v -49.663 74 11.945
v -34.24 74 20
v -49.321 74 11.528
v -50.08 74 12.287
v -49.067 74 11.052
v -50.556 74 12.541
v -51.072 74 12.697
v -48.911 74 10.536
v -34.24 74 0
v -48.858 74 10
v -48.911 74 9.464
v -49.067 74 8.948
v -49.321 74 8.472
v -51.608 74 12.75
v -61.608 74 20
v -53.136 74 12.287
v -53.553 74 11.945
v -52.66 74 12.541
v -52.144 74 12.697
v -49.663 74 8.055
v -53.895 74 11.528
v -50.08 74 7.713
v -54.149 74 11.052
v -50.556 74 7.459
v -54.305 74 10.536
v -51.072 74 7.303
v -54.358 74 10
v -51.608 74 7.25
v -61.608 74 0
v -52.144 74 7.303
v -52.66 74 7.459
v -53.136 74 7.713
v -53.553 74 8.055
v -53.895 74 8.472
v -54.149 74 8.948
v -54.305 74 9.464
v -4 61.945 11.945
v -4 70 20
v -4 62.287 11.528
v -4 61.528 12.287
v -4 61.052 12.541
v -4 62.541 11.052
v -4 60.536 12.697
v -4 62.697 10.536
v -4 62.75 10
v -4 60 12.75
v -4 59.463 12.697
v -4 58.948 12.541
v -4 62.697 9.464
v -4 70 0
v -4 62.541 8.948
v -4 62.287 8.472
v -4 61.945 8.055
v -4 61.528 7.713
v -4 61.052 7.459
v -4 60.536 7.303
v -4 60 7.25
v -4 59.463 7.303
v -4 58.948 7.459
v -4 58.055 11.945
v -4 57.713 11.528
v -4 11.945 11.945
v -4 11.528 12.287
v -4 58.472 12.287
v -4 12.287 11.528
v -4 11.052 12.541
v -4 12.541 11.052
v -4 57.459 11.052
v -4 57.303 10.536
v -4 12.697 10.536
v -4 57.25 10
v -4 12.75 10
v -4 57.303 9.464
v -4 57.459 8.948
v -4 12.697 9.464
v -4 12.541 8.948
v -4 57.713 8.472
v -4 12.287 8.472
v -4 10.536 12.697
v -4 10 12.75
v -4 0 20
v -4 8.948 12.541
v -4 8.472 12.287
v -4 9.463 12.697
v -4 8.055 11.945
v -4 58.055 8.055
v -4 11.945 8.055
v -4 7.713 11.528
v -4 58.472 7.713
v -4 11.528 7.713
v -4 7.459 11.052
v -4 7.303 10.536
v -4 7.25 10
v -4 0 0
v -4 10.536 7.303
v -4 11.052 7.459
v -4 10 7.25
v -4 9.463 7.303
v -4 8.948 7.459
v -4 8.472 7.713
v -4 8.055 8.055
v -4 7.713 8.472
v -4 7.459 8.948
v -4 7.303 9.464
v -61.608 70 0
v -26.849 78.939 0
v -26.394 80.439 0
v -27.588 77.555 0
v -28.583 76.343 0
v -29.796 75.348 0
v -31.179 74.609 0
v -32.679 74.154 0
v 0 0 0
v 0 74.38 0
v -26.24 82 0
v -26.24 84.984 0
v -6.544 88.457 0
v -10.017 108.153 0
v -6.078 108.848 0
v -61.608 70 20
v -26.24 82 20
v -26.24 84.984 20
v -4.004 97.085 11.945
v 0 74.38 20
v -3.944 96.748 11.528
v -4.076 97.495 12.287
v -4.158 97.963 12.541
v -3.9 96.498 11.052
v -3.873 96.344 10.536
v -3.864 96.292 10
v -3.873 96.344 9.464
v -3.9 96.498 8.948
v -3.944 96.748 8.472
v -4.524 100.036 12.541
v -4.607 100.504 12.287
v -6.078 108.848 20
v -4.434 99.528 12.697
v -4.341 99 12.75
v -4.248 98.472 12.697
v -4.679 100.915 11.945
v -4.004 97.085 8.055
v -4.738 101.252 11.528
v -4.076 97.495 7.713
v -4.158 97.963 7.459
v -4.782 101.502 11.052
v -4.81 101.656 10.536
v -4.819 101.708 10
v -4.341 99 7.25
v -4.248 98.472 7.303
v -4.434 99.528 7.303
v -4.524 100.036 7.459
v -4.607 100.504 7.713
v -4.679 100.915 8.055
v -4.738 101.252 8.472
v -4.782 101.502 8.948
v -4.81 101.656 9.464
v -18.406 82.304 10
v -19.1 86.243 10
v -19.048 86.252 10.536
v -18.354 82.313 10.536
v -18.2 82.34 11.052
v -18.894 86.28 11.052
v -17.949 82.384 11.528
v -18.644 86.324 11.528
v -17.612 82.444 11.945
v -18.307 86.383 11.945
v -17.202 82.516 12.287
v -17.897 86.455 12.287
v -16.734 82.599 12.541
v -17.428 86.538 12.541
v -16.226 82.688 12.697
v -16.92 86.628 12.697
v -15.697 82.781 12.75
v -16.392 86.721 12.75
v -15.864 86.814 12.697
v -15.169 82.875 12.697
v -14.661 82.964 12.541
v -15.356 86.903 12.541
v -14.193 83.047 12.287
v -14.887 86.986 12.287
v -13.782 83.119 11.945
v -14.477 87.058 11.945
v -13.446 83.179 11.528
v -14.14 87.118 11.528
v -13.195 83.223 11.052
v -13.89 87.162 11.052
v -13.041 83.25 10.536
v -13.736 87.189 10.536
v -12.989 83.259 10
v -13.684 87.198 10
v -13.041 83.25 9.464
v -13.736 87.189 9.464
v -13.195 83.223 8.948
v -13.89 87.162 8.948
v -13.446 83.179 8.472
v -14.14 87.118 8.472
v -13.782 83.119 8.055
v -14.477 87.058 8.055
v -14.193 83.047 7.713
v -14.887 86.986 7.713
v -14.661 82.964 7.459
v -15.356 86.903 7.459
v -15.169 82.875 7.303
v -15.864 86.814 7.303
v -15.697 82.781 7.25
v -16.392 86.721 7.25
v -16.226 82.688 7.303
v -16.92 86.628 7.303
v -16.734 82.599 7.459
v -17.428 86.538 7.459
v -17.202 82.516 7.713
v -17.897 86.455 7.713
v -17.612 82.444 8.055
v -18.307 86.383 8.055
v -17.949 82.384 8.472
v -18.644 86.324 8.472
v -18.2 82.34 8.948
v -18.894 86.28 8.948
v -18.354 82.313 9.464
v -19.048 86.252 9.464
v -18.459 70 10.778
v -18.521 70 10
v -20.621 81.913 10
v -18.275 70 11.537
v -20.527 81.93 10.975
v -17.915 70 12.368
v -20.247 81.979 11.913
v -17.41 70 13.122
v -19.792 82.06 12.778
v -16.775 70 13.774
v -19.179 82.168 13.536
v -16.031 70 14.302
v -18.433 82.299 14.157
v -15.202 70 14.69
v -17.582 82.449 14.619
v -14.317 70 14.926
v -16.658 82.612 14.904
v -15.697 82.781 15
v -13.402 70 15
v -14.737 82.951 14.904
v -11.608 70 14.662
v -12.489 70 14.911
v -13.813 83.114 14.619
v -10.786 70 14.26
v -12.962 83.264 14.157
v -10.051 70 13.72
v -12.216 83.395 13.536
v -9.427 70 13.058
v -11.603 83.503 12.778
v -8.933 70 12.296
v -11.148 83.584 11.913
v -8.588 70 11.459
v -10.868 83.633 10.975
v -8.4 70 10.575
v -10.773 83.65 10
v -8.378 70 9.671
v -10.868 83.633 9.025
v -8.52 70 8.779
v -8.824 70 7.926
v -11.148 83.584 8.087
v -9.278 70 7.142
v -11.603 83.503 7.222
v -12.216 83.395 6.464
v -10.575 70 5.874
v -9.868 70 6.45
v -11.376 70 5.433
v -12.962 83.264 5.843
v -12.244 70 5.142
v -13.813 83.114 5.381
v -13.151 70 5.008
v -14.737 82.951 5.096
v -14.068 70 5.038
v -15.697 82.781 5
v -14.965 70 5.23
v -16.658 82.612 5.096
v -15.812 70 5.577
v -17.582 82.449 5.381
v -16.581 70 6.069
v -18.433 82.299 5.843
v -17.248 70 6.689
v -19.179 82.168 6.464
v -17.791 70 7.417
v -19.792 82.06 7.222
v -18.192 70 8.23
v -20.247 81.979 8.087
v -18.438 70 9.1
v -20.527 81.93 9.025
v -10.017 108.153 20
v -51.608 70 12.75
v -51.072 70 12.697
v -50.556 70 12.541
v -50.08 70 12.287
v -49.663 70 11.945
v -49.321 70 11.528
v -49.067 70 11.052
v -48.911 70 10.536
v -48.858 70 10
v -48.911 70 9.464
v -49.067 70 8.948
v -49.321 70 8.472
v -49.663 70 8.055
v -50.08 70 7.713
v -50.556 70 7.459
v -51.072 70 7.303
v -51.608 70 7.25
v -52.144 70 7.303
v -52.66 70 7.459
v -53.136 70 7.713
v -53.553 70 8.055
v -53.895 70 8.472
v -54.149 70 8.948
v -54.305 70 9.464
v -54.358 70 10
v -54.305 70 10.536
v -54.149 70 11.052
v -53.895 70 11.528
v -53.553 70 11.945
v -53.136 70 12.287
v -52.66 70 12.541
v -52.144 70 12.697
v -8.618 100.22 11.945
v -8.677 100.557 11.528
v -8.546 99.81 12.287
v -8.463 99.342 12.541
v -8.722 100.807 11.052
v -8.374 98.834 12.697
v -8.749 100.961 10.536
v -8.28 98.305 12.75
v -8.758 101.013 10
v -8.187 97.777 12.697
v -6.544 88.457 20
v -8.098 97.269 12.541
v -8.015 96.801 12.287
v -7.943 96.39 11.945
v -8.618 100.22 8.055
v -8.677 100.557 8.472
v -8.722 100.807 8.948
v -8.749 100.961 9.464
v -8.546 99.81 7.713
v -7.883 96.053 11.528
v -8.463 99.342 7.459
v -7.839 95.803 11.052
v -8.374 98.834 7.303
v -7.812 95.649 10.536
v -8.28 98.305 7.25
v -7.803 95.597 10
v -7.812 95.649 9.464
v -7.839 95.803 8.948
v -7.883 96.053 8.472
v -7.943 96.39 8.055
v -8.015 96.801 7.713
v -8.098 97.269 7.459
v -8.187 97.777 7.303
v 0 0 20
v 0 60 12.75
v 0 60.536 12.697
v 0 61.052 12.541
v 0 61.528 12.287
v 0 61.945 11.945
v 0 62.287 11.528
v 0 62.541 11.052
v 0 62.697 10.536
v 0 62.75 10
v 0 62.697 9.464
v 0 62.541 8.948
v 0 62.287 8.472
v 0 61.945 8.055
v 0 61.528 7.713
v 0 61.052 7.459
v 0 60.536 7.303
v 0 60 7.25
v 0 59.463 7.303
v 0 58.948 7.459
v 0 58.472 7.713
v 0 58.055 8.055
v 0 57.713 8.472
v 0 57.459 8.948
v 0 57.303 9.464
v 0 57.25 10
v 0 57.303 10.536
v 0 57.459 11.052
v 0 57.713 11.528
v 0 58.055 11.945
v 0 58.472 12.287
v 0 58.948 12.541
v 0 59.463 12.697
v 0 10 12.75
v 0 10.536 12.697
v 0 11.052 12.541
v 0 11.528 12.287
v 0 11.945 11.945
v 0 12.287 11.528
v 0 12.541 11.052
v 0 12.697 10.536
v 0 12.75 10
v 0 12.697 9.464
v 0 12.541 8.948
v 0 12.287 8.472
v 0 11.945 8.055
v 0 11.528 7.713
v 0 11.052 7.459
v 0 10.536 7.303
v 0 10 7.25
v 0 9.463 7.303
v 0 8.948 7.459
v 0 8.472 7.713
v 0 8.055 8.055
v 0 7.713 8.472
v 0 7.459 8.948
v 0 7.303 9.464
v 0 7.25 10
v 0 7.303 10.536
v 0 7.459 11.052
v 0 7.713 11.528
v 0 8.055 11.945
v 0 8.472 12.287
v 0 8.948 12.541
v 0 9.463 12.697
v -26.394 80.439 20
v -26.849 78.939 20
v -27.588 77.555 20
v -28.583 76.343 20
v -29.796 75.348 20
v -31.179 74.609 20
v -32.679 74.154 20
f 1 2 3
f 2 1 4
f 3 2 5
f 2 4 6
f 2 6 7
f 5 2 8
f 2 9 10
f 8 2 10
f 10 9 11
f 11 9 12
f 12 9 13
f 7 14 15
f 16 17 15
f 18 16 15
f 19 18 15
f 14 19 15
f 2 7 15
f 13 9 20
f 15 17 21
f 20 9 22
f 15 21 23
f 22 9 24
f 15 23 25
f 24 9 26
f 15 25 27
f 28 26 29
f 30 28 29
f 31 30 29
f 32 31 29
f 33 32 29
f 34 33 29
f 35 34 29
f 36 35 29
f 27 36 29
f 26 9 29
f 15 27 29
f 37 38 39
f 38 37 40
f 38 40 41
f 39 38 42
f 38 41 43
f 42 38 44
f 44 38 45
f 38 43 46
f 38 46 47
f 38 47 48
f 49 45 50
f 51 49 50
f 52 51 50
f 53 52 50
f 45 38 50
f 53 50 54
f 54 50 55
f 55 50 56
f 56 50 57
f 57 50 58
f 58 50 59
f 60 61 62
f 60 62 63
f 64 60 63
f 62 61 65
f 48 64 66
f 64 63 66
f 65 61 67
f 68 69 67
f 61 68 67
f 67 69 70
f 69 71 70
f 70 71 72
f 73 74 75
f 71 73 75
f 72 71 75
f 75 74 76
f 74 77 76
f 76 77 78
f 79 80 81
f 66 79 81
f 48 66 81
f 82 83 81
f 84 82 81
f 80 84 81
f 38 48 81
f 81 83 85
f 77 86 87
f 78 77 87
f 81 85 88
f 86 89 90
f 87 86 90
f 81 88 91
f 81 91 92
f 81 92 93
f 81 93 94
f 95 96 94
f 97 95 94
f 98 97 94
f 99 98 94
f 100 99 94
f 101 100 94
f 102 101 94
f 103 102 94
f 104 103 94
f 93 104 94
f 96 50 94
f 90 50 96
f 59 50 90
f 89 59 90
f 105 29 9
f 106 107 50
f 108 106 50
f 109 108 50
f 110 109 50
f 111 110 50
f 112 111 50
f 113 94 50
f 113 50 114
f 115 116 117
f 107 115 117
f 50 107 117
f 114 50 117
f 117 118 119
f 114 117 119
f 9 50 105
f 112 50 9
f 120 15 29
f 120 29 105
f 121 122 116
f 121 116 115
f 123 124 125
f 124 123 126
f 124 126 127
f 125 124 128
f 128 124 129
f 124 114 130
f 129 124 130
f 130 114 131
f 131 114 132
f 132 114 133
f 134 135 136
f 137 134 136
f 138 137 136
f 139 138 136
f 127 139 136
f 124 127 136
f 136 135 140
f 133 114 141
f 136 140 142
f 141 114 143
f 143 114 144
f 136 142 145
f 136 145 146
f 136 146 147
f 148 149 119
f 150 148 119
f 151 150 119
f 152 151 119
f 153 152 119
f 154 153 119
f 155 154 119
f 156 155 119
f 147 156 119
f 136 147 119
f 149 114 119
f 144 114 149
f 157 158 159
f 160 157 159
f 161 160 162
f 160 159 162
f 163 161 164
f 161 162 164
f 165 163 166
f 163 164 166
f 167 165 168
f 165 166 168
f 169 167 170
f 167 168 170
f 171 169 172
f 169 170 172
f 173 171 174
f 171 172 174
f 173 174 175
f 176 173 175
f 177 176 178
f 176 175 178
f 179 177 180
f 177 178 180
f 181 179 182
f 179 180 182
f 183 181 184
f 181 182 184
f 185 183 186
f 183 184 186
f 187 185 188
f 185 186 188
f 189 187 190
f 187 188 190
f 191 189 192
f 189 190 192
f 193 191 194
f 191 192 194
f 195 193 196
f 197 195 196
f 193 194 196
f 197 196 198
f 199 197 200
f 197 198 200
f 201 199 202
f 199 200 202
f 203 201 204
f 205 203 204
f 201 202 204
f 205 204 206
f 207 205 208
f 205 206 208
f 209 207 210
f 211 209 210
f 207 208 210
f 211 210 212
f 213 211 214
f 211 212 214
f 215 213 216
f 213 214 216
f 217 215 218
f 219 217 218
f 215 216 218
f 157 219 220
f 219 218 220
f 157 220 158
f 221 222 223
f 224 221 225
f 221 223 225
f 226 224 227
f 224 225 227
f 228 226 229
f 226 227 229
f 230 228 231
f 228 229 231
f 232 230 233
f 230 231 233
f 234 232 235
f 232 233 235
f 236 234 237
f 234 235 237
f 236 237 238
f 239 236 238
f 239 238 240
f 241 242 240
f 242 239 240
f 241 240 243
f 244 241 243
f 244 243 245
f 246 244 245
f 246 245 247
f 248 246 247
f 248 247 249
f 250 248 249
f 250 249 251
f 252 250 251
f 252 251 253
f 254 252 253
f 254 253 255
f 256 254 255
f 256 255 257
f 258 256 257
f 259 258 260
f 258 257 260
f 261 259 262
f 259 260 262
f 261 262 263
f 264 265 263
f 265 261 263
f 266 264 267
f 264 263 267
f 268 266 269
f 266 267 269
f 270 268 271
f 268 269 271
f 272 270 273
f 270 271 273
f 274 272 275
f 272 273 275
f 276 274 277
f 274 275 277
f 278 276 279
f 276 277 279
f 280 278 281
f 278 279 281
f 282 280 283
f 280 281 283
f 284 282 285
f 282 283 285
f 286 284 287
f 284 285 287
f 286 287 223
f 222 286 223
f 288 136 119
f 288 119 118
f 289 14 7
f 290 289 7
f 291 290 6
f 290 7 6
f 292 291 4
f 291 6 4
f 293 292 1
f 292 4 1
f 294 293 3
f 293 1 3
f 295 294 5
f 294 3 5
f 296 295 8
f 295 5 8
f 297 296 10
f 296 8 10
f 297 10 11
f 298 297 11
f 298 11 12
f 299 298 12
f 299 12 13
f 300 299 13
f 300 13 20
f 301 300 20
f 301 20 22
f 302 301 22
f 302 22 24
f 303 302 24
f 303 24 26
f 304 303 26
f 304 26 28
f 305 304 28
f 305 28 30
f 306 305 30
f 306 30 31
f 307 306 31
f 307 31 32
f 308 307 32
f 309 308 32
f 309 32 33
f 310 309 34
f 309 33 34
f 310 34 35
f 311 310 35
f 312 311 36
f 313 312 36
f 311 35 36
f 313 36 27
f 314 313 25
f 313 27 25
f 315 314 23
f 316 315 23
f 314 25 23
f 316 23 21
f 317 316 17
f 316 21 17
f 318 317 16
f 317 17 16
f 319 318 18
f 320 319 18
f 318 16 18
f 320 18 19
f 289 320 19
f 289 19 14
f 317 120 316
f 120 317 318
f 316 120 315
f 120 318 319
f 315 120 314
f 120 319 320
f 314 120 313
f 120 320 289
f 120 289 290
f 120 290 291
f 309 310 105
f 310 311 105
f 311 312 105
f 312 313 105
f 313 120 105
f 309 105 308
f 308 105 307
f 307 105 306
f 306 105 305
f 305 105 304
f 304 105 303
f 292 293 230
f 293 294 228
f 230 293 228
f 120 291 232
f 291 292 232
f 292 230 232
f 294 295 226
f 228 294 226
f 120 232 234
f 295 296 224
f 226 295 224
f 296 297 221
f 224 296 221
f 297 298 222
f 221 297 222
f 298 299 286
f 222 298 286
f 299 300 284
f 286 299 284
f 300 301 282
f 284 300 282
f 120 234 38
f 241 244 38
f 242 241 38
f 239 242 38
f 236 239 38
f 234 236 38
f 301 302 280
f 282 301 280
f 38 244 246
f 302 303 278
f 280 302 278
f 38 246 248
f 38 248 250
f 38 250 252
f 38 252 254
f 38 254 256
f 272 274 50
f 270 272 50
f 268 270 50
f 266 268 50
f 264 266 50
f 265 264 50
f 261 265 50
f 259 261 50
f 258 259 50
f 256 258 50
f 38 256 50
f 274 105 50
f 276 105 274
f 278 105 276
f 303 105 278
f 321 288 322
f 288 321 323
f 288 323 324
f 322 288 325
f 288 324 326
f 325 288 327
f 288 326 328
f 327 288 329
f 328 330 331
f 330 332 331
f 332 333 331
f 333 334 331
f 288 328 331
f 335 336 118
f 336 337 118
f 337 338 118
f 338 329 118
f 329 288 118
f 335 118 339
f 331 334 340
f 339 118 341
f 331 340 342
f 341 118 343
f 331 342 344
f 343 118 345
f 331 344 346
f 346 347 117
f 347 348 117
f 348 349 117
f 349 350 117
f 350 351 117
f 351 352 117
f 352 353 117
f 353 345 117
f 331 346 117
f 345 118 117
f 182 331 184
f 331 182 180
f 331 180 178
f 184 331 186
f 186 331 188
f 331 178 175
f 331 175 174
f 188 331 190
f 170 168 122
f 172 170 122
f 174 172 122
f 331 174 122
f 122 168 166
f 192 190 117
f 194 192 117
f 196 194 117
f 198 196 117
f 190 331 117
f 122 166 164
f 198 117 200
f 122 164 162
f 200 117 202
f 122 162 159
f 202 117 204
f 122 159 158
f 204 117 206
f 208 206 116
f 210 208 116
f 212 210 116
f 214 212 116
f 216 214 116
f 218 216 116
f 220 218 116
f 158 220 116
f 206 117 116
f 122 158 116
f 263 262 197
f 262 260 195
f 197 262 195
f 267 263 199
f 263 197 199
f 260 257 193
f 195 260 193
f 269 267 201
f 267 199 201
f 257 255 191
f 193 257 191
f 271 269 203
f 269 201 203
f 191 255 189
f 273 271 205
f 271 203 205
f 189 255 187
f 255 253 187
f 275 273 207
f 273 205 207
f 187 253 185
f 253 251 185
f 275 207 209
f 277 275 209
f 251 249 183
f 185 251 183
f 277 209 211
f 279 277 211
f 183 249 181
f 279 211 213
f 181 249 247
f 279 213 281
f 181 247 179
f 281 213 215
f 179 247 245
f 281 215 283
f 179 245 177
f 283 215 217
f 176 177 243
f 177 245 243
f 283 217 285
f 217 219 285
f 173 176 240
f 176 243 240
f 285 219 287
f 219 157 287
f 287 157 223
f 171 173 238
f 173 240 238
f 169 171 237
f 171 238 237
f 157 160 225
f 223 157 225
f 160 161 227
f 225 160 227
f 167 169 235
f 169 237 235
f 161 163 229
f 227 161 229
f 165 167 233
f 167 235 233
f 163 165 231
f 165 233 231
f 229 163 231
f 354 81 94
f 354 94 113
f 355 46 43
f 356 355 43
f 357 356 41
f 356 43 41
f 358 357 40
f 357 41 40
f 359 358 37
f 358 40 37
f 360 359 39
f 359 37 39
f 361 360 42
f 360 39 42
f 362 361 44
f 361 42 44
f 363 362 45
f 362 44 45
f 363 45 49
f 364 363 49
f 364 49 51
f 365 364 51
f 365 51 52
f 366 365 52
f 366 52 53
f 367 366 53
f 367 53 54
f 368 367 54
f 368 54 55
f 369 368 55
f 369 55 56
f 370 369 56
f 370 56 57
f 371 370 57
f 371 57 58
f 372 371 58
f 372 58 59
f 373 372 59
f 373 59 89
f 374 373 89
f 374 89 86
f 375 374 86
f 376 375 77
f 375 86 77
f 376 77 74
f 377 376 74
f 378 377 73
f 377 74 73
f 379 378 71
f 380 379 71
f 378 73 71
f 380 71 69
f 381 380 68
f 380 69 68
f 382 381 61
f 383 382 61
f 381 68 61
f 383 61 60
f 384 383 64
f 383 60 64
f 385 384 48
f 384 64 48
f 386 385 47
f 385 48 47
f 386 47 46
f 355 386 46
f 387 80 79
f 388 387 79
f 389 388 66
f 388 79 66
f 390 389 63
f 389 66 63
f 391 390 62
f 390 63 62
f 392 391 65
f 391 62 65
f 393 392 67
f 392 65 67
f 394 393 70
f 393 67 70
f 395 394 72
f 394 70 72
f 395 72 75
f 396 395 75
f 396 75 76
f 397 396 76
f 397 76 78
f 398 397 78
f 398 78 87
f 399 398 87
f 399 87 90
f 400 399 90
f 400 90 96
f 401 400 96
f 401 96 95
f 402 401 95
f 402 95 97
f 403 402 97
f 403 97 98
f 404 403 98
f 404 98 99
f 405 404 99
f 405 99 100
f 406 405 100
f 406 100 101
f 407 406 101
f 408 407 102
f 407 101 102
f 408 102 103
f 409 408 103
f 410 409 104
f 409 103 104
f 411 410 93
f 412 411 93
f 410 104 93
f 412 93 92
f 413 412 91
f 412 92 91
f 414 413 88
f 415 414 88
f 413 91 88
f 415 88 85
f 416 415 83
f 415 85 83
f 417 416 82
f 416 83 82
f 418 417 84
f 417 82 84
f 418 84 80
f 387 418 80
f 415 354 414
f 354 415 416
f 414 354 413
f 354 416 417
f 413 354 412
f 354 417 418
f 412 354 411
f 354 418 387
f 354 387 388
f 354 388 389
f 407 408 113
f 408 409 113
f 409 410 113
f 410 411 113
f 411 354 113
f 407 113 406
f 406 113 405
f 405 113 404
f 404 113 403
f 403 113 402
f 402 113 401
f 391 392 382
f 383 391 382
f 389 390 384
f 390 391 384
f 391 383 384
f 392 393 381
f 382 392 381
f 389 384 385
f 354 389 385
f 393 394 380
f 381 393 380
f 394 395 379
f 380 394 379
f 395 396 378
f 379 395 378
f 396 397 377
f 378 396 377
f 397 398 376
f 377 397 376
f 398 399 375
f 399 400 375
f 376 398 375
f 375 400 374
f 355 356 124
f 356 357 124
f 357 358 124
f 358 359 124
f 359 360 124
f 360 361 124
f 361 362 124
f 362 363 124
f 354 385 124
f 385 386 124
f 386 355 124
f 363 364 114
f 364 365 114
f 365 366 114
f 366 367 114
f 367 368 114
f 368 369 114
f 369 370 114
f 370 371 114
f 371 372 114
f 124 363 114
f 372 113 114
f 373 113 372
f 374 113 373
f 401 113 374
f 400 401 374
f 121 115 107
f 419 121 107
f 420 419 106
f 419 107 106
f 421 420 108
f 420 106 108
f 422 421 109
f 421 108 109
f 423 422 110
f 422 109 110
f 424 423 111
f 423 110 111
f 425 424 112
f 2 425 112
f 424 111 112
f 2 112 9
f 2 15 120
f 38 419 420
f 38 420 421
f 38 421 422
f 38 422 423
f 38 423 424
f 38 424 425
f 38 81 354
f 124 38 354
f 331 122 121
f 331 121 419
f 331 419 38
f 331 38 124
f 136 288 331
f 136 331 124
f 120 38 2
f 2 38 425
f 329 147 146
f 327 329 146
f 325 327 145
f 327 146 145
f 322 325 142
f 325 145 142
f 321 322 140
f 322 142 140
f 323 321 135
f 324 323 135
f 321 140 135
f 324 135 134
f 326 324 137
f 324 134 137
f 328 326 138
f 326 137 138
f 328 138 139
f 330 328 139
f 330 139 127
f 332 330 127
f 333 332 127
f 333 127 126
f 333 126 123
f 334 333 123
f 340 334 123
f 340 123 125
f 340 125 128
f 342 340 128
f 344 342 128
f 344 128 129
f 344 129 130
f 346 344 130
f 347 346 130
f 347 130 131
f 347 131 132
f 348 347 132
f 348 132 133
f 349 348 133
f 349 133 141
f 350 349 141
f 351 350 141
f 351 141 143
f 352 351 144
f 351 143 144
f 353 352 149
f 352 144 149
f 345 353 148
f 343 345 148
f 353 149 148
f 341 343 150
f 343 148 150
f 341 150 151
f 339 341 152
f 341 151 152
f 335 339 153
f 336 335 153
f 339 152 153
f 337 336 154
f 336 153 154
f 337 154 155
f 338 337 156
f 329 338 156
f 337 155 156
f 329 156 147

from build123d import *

# Parameters (mm, degrees)
BOSS_EXTRUDE1_DEPTH = 20
CUT_EXTRUDE5_REACH  = 126.766
SKETCH6_R           = 2.74999595
CUT_EXTRUDE10_REACH = 133.489
SKETCH11_R          = 2.75
CUT_EXTRUDE11_REACH = 100.344
SKETCH12_R          = 2.75
SKETCH13_R          = 2.75
CUT_EXTRUDE12_DEPTH = 4
CUT_EXTRUDE13_REACH = 99.421
SKETCH14_R          = 5


with BuildPart() as part:
    # Sketch1 → Boss-Extrude1 (new body)
    with BuildSketch(Plane.XY):
        with BuildLine():
            Line((0, 74.379660875), (-6.077686218, 108.84793223))
            Line((-6.077686218, 108.84793223), (-10.01691723, 108.153339519))
            Line((-10.01691723, 108.153339519), (-6.543953677, 88.457184459))
            Line((-6.543953677, 88.457184459), (-26.240108737, 84.984220906))
            Line((-26.240108737, 84.984220906), (-26.240108737, 81.999969263))
            ThreePointArc((-26.240108737, 81.999969263), (-28.583254488, 76.343115014), (-34.240108737, 73.999969263))
            Line((-34.240108737, 73.999969263), (-61.608001, 73.999969263))
            Line((-61.608001, 73.999969263), (-61.608001, 69.999969263))
            Line((-61.608001, 69.999969263), (-4, 69.999969263))
            Line((-4, 69.999969263), (-4, 0))
            Line((-4, 0), (0, 0))
            Line((0, 0), (0, 74.379660875))
        make_face()
    extrude(amount=BOSS_EXTRUDE1_DEPTH)

    # Sketch6 → Cut-Extrude5 (cut, up to next)
    with BuildSketch(Plane.ZY.offset(4), mode=Mode.PRIVATE) as cut_extrude5_sk1:
        with Locations((9.9999995, 59.999977673)):
            Circle(SKETCH6_R)
    cut_extrude5_tool1 = extrude(cut_extrude5_sk1.sketch, amount=-CUT_EXTRUDE5_REACH, mode=Mode.PRIVATE) & part.part
    # Sketch6 → Cut-Extrude5 (cut, up to next)
    with BuildSketch(Plane.ZY.offset(4), mode=Mode.PRIVATE) as cut_extrude5_sk2:
        with Locations((9.9999995, 9.999962864)):
            Circle(SKETCH6_R)
    cut_extrude5_tool2 = extrude(cut_extrude5_sk2.sketch, amount=-CUT_EXTRUDE5_REACH, mode=Mode.PRIVATE) & part.part
    add(cut_extrude5_tool1.solids().sort_by_distance((-4, 59.999978, 9.999999))[0], mode=Mode.SUBTRACT)
    add(cut_extrude5_tool2.solids().sort_by_distance((-4, 9.999963, 9.999999))[0], mode=Mode.SUBTRACT)

    # Sketch11 → Cut-Extrude10 (cut, up to next)
    with BuildSketch(Plane(origin=(12.719671136, 2.242821207, 0), x_dir=(0, 0, -1), z_dir=(0.9848077530122074, 0.1736481776669349, 0)), mode=Mode.PRIVATE) as cut_extrude10_sk1:
        with Locations(Location((-10, 98.249666696, 0), (0, 0, 90))):
            Circle(SKETCH11_R)
    cut_extrude10_tool1 = extrude(cut_extrude10_sk1.sketch, amount=-CUT_EXTRUDE10_REACH, mode=Mode.PRIVATE) & part.part
    add(cut_extrude10_tool1.solids().sort_by_distance((-4.341204, 98.999855, 10))[0], mode=Mode.SUBTRACT)

    # Sketch12 → Cut-Extrude11 (cut, up to next)
    with BuildSketch(Plane(origin=(0, 73.999969263, 0), x_dir=(1, 0, 0), z_dir=(0, 1, 0)), mode=Mode.PRIVATE) as cut_extrude11_sk1:
        with Locations(Location((-51.608001, -10, 0), (0, 0, 270))):
            Circle(SKETCH12_R)
    cut_extrude11_tool1 = extrude(cut_extrude11_sk1.sketch, amount=-CUT_EXTRUDE11_REACH, mode=Mode.PRIVATE) & part.part
    add(cut_extrude11_tool1.solids().sort_by_distance((-51.608001, 73.999969, 10))[0], mode=Mode.SUBTRACT)

    # Sketch13 → Cut-Extrude12 (cut)
    with BuildSketch(Plane(origin=(-15.324393801, 86.908955963, 0), x_dir=(0.9848077530122072, 0.17364817766693516, 0), z_dir=(-0.1736481776669352, 0.9848077530122074, 0))):
        with Locations(Location((-1.084107434, -10, 0), (0, 0, 180))):
            Circle(SKETCH13_R)
    extrude(amount=-CUT_EXTRUDE12_DEPTH, mode=Mode.SUBTRACT)

    # Cut-Extrude13: up to this plane
    cut_extrude13_end = Plane(origin=(-4, 69.999969263, 20), z_dir=(0, -1, 0))
    # Sketch14 → Cut-Extrude13 (cut, up to the surface)
    with BuildSketch(Plane(origin=(-14.629801091, 82.969724951, 0), x_dir=(0.9848077530122072, 0.17364817766693522, 0), z_dir=(-0.17364817766693524, 0.9848077530122074, 0)), mode=Mode.PRIVATE) as cut_extrude13_sk1:
        with Locations(Location((-1.084107434, -10, 0), (0, 0, 180))):
            Circle(SKETCH14_R)
    cut_extrude13_tool1 = split(extrude(cut_extrude13_sk1.sketch, amount=-CUT_EXTRUDE13_REACH, mode=Mode.PRIVATE), bisect_by=cut_extrude13_end, keep=Keep.BOTH, mode=Mode.PRIVATE)
    add(cut_extrude13_tool1.solids().sort_by_distance((-15.697438, 82.781472, 10))[0], mode=Mode.SUBTRACT)


solid = part.part
